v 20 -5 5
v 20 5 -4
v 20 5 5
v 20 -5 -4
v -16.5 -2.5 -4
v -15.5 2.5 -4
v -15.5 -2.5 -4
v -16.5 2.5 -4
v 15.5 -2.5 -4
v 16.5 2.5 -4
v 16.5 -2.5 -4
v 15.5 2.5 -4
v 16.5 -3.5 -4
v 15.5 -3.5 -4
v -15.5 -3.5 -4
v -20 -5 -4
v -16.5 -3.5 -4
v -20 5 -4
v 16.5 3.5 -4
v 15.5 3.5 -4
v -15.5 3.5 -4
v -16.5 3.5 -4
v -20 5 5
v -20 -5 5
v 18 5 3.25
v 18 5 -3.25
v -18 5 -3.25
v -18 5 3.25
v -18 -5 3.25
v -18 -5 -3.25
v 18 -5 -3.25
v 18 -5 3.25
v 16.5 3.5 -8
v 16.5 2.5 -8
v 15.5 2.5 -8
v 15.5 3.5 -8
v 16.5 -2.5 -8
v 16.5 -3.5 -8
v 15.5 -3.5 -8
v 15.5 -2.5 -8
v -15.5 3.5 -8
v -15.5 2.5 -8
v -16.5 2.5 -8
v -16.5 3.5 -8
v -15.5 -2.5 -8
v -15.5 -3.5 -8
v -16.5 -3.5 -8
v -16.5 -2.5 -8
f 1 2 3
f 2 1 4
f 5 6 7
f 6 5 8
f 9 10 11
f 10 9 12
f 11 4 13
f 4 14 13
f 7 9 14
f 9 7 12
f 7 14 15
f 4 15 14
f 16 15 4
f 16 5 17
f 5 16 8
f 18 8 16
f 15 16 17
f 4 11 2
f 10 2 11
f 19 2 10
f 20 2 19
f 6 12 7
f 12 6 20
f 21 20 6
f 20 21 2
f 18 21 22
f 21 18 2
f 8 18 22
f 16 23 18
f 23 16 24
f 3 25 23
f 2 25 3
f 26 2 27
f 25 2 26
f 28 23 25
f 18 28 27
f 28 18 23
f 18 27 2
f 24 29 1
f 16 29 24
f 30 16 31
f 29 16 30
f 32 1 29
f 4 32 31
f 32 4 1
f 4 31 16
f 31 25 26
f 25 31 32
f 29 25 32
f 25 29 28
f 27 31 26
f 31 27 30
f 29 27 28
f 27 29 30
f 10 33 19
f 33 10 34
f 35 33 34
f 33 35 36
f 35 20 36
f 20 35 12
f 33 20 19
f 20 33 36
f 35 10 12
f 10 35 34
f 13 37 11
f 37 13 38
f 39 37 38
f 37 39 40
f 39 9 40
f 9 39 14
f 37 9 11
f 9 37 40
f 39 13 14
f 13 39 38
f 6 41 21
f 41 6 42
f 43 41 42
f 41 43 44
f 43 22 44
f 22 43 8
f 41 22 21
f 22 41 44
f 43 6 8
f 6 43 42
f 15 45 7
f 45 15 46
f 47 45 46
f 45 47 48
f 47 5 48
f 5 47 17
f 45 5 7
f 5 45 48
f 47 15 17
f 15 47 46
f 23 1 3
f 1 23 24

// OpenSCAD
module Table_Office(){


color("#986931")
translate([0,0,4.5]){
cube([40,6,1], center =true);
}

color("#36220b")
translate([0,4,4.5]){
cube([40,2,1], center =true);
}

color("#36220b")
translate([0,-4,4.5]){
cube([40,2,1], center =true);
}

color("#5e3e17")
difference(){
cube([40,10,8], center =true);

cube([36,12,6.5], center =true);
}



color("#1a1818"){
translate([16,3,-6]){
cube([1,1,4], center =true);
}

translate([16,-3,-6]){
cube([1,1,4], center =true);
}

translate([-16,3,-6]){
cube([1,1,4], center =true);
}

translate([-16,-3,-6]){
cube([1,1,4], center =true);
}

}

}

Table_Office();
